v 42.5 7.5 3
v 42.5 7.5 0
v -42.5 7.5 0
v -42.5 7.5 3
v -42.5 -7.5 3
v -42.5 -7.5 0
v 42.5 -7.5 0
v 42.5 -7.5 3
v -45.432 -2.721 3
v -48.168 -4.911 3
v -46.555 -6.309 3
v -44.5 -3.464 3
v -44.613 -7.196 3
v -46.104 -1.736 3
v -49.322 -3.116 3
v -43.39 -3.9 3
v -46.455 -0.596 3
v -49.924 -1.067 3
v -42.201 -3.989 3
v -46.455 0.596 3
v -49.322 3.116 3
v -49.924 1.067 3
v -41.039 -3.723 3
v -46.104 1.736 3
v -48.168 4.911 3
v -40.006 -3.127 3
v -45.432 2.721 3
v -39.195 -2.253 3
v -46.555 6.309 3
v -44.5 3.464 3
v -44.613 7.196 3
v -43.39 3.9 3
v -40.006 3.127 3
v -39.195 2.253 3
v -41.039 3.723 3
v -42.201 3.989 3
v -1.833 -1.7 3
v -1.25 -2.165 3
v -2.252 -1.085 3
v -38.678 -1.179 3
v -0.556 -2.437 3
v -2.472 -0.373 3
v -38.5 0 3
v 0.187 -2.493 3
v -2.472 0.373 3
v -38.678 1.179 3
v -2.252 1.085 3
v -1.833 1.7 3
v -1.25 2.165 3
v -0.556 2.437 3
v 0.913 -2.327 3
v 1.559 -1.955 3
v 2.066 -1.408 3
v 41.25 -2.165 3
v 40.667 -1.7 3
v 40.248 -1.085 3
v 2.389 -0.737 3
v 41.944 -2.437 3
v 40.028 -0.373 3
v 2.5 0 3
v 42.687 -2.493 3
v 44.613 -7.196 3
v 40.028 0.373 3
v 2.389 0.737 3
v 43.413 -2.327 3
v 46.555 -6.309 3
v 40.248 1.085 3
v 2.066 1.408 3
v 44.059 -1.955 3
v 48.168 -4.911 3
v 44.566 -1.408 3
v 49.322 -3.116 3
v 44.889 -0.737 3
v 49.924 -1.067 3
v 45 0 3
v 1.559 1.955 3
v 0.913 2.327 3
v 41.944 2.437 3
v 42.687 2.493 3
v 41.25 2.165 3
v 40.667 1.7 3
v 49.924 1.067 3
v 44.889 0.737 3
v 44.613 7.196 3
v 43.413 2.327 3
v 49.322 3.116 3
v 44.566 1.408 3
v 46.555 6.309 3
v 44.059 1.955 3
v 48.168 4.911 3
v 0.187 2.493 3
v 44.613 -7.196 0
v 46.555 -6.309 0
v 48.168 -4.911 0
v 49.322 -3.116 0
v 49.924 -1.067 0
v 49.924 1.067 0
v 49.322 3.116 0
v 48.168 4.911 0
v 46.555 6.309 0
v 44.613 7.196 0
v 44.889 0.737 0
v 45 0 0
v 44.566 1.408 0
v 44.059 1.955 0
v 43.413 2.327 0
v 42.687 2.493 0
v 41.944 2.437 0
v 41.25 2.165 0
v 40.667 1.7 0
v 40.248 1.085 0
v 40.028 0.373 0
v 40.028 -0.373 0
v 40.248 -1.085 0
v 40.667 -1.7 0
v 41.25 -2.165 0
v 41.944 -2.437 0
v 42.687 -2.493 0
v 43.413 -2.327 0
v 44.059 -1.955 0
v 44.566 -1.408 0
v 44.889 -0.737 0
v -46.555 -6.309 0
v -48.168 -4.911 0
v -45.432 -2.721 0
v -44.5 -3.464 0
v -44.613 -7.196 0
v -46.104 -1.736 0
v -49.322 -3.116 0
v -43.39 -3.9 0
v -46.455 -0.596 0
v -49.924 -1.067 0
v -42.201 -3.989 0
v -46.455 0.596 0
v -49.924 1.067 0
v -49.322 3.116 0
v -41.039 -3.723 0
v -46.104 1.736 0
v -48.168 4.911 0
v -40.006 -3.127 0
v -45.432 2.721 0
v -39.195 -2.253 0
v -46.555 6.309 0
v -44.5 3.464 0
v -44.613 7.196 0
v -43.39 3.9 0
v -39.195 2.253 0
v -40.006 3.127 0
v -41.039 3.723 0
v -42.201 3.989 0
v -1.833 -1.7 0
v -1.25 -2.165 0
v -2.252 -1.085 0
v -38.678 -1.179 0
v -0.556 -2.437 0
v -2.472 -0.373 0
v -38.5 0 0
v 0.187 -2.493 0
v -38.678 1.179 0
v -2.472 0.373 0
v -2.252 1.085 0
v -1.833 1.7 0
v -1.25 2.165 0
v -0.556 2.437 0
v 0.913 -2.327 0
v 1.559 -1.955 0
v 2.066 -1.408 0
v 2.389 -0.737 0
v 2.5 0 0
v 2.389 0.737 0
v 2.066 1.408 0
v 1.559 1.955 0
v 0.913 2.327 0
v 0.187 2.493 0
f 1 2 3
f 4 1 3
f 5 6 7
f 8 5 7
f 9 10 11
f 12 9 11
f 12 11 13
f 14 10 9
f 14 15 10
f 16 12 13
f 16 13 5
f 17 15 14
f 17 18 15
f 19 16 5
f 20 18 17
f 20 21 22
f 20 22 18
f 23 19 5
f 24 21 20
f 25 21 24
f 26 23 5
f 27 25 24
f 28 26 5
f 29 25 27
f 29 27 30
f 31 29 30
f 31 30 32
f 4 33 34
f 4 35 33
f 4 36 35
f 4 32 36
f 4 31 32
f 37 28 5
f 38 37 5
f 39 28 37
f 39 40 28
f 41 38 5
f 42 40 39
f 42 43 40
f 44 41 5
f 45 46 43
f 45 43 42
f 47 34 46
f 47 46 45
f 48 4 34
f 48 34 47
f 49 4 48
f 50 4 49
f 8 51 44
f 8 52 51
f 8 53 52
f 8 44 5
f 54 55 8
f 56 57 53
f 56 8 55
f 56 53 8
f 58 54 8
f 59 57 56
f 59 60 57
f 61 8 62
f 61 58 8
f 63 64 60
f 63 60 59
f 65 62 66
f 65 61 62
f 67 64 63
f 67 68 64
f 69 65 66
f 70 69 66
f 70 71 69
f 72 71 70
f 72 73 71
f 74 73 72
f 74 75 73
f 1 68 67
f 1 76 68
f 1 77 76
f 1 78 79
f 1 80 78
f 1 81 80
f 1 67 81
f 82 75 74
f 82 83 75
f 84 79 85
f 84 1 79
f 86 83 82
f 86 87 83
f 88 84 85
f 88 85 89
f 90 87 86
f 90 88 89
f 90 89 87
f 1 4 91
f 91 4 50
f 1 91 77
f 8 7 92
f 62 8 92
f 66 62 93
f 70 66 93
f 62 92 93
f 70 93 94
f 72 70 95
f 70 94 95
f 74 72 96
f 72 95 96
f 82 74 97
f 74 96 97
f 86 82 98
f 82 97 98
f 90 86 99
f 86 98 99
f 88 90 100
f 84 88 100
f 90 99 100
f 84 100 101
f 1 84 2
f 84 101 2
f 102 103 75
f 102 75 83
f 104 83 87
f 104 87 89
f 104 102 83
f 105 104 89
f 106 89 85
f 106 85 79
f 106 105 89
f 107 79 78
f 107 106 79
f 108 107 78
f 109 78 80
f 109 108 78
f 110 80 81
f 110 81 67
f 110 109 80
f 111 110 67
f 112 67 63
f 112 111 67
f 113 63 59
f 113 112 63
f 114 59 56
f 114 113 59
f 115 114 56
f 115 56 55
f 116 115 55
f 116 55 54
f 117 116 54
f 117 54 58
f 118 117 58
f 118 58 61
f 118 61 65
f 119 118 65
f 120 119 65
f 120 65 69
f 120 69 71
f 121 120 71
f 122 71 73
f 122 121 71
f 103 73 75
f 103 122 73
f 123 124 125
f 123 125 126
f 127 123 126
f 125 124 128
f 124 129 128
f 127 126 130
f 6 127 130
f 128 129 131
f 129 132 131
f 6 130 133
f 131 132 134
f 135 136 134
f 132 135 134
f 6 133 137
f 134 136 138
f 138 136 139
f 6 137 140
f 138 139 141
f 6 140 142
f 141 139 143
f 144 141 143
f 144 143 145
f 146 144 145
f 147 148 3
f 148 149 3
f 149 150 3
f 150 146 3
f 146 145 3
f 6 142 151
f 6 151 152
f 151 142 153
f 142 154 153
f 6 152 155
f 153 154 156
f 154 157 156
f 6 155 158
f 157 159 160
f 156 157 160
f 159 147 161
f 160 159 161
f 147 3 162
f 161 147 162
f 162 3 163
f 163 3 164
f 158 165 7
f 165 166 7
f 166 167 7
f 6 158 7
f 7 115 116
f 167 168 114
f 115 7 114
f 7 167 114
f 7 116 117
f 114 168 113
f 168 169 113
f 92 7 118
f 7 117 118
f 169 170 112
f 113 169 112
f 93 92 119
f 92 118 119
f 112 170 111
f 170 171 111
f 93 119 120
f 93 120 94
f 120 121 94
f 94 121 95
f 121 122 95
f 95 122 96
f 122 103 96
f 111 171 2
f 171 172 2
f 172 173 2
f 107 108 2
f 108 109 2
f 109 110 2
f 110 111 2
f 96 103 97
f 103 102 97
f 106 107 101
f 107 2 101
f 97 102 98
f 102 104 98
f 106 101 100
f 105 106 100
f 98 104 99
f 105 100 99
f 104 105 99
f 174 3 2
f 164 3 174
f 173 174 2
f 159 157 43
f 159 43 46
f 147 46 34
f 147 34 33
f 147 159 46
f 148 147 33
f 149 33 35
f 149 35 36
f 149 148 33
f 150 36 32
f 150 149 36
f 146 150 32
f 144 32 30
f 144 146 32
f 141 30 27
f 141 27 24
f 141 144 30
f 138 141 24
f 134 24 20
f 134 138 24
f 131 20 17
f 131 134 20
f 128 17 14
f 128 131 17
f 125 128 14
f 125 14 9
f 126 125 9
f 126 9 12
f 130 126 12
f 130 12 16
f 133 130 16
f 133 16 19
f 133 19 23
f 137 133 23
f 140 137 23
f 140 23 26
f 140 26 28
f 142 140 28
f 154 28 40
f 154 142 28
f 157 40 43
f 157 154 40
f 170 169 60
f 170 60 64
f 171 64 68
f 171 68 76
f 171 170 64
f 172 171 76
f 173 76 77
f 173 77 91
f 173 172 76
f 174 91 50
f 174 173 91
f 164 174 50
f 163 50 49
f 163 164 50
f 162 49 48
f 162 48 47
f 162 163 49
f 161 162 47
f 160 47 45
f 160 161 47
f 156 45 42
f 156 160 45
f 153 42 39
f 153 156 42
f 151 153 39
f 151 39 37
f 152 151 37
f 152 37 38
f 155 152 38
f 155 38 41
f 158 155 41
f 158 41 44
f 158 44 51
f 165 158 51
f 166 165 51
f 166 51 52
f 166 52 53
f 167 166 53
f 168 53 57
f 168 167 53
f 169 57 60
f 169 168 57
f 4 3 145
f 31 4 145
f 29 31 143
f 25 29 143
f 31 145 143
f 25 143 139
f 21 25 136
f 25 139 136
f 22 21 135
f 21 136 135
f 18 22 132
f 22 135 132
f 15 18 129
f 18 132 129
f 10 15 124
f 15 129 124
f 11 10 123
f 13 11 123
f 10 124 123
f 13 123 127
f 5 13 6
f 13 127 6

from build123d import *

# Parameters (mm, degrees)
SKETCH_1_R      = 4
SKETCH_1_R_2    = 2.5
EXTRUDE_1_DEPTH = 3


with BuildPart() as part:
    # 草图1 → 凸台-拉伸1 (new body)
    with BuildSketch(Plane.XY):
        with BuildLine():
            Line((-42.5, -7.5), (42.5, -7.5))
            ThreePointArc((42.5, -7.5), (50, 0), (42.5, 7.5))
            Line((42.5, 7.5), (-42.5, 7.5))
            ThreePointArc((-42.5, 7.5), (-50, 0), (-42.5, -7.5))
        make_face()
        with Locations((-42.5, 0)):
            Circle(SKETCH_1_R, mode=Mode.SUBTRACT)
        with Locations((42.5, 0)):
            Circle(SKETCH_1_R_2, mode=Mode.SUBTRACT)
        Circle(SKETCH_1_R_2, mode=Mode.SUBTRACT)
    extrude(amount=EXTRUDE_1_DEPTH)


solid = part.part
